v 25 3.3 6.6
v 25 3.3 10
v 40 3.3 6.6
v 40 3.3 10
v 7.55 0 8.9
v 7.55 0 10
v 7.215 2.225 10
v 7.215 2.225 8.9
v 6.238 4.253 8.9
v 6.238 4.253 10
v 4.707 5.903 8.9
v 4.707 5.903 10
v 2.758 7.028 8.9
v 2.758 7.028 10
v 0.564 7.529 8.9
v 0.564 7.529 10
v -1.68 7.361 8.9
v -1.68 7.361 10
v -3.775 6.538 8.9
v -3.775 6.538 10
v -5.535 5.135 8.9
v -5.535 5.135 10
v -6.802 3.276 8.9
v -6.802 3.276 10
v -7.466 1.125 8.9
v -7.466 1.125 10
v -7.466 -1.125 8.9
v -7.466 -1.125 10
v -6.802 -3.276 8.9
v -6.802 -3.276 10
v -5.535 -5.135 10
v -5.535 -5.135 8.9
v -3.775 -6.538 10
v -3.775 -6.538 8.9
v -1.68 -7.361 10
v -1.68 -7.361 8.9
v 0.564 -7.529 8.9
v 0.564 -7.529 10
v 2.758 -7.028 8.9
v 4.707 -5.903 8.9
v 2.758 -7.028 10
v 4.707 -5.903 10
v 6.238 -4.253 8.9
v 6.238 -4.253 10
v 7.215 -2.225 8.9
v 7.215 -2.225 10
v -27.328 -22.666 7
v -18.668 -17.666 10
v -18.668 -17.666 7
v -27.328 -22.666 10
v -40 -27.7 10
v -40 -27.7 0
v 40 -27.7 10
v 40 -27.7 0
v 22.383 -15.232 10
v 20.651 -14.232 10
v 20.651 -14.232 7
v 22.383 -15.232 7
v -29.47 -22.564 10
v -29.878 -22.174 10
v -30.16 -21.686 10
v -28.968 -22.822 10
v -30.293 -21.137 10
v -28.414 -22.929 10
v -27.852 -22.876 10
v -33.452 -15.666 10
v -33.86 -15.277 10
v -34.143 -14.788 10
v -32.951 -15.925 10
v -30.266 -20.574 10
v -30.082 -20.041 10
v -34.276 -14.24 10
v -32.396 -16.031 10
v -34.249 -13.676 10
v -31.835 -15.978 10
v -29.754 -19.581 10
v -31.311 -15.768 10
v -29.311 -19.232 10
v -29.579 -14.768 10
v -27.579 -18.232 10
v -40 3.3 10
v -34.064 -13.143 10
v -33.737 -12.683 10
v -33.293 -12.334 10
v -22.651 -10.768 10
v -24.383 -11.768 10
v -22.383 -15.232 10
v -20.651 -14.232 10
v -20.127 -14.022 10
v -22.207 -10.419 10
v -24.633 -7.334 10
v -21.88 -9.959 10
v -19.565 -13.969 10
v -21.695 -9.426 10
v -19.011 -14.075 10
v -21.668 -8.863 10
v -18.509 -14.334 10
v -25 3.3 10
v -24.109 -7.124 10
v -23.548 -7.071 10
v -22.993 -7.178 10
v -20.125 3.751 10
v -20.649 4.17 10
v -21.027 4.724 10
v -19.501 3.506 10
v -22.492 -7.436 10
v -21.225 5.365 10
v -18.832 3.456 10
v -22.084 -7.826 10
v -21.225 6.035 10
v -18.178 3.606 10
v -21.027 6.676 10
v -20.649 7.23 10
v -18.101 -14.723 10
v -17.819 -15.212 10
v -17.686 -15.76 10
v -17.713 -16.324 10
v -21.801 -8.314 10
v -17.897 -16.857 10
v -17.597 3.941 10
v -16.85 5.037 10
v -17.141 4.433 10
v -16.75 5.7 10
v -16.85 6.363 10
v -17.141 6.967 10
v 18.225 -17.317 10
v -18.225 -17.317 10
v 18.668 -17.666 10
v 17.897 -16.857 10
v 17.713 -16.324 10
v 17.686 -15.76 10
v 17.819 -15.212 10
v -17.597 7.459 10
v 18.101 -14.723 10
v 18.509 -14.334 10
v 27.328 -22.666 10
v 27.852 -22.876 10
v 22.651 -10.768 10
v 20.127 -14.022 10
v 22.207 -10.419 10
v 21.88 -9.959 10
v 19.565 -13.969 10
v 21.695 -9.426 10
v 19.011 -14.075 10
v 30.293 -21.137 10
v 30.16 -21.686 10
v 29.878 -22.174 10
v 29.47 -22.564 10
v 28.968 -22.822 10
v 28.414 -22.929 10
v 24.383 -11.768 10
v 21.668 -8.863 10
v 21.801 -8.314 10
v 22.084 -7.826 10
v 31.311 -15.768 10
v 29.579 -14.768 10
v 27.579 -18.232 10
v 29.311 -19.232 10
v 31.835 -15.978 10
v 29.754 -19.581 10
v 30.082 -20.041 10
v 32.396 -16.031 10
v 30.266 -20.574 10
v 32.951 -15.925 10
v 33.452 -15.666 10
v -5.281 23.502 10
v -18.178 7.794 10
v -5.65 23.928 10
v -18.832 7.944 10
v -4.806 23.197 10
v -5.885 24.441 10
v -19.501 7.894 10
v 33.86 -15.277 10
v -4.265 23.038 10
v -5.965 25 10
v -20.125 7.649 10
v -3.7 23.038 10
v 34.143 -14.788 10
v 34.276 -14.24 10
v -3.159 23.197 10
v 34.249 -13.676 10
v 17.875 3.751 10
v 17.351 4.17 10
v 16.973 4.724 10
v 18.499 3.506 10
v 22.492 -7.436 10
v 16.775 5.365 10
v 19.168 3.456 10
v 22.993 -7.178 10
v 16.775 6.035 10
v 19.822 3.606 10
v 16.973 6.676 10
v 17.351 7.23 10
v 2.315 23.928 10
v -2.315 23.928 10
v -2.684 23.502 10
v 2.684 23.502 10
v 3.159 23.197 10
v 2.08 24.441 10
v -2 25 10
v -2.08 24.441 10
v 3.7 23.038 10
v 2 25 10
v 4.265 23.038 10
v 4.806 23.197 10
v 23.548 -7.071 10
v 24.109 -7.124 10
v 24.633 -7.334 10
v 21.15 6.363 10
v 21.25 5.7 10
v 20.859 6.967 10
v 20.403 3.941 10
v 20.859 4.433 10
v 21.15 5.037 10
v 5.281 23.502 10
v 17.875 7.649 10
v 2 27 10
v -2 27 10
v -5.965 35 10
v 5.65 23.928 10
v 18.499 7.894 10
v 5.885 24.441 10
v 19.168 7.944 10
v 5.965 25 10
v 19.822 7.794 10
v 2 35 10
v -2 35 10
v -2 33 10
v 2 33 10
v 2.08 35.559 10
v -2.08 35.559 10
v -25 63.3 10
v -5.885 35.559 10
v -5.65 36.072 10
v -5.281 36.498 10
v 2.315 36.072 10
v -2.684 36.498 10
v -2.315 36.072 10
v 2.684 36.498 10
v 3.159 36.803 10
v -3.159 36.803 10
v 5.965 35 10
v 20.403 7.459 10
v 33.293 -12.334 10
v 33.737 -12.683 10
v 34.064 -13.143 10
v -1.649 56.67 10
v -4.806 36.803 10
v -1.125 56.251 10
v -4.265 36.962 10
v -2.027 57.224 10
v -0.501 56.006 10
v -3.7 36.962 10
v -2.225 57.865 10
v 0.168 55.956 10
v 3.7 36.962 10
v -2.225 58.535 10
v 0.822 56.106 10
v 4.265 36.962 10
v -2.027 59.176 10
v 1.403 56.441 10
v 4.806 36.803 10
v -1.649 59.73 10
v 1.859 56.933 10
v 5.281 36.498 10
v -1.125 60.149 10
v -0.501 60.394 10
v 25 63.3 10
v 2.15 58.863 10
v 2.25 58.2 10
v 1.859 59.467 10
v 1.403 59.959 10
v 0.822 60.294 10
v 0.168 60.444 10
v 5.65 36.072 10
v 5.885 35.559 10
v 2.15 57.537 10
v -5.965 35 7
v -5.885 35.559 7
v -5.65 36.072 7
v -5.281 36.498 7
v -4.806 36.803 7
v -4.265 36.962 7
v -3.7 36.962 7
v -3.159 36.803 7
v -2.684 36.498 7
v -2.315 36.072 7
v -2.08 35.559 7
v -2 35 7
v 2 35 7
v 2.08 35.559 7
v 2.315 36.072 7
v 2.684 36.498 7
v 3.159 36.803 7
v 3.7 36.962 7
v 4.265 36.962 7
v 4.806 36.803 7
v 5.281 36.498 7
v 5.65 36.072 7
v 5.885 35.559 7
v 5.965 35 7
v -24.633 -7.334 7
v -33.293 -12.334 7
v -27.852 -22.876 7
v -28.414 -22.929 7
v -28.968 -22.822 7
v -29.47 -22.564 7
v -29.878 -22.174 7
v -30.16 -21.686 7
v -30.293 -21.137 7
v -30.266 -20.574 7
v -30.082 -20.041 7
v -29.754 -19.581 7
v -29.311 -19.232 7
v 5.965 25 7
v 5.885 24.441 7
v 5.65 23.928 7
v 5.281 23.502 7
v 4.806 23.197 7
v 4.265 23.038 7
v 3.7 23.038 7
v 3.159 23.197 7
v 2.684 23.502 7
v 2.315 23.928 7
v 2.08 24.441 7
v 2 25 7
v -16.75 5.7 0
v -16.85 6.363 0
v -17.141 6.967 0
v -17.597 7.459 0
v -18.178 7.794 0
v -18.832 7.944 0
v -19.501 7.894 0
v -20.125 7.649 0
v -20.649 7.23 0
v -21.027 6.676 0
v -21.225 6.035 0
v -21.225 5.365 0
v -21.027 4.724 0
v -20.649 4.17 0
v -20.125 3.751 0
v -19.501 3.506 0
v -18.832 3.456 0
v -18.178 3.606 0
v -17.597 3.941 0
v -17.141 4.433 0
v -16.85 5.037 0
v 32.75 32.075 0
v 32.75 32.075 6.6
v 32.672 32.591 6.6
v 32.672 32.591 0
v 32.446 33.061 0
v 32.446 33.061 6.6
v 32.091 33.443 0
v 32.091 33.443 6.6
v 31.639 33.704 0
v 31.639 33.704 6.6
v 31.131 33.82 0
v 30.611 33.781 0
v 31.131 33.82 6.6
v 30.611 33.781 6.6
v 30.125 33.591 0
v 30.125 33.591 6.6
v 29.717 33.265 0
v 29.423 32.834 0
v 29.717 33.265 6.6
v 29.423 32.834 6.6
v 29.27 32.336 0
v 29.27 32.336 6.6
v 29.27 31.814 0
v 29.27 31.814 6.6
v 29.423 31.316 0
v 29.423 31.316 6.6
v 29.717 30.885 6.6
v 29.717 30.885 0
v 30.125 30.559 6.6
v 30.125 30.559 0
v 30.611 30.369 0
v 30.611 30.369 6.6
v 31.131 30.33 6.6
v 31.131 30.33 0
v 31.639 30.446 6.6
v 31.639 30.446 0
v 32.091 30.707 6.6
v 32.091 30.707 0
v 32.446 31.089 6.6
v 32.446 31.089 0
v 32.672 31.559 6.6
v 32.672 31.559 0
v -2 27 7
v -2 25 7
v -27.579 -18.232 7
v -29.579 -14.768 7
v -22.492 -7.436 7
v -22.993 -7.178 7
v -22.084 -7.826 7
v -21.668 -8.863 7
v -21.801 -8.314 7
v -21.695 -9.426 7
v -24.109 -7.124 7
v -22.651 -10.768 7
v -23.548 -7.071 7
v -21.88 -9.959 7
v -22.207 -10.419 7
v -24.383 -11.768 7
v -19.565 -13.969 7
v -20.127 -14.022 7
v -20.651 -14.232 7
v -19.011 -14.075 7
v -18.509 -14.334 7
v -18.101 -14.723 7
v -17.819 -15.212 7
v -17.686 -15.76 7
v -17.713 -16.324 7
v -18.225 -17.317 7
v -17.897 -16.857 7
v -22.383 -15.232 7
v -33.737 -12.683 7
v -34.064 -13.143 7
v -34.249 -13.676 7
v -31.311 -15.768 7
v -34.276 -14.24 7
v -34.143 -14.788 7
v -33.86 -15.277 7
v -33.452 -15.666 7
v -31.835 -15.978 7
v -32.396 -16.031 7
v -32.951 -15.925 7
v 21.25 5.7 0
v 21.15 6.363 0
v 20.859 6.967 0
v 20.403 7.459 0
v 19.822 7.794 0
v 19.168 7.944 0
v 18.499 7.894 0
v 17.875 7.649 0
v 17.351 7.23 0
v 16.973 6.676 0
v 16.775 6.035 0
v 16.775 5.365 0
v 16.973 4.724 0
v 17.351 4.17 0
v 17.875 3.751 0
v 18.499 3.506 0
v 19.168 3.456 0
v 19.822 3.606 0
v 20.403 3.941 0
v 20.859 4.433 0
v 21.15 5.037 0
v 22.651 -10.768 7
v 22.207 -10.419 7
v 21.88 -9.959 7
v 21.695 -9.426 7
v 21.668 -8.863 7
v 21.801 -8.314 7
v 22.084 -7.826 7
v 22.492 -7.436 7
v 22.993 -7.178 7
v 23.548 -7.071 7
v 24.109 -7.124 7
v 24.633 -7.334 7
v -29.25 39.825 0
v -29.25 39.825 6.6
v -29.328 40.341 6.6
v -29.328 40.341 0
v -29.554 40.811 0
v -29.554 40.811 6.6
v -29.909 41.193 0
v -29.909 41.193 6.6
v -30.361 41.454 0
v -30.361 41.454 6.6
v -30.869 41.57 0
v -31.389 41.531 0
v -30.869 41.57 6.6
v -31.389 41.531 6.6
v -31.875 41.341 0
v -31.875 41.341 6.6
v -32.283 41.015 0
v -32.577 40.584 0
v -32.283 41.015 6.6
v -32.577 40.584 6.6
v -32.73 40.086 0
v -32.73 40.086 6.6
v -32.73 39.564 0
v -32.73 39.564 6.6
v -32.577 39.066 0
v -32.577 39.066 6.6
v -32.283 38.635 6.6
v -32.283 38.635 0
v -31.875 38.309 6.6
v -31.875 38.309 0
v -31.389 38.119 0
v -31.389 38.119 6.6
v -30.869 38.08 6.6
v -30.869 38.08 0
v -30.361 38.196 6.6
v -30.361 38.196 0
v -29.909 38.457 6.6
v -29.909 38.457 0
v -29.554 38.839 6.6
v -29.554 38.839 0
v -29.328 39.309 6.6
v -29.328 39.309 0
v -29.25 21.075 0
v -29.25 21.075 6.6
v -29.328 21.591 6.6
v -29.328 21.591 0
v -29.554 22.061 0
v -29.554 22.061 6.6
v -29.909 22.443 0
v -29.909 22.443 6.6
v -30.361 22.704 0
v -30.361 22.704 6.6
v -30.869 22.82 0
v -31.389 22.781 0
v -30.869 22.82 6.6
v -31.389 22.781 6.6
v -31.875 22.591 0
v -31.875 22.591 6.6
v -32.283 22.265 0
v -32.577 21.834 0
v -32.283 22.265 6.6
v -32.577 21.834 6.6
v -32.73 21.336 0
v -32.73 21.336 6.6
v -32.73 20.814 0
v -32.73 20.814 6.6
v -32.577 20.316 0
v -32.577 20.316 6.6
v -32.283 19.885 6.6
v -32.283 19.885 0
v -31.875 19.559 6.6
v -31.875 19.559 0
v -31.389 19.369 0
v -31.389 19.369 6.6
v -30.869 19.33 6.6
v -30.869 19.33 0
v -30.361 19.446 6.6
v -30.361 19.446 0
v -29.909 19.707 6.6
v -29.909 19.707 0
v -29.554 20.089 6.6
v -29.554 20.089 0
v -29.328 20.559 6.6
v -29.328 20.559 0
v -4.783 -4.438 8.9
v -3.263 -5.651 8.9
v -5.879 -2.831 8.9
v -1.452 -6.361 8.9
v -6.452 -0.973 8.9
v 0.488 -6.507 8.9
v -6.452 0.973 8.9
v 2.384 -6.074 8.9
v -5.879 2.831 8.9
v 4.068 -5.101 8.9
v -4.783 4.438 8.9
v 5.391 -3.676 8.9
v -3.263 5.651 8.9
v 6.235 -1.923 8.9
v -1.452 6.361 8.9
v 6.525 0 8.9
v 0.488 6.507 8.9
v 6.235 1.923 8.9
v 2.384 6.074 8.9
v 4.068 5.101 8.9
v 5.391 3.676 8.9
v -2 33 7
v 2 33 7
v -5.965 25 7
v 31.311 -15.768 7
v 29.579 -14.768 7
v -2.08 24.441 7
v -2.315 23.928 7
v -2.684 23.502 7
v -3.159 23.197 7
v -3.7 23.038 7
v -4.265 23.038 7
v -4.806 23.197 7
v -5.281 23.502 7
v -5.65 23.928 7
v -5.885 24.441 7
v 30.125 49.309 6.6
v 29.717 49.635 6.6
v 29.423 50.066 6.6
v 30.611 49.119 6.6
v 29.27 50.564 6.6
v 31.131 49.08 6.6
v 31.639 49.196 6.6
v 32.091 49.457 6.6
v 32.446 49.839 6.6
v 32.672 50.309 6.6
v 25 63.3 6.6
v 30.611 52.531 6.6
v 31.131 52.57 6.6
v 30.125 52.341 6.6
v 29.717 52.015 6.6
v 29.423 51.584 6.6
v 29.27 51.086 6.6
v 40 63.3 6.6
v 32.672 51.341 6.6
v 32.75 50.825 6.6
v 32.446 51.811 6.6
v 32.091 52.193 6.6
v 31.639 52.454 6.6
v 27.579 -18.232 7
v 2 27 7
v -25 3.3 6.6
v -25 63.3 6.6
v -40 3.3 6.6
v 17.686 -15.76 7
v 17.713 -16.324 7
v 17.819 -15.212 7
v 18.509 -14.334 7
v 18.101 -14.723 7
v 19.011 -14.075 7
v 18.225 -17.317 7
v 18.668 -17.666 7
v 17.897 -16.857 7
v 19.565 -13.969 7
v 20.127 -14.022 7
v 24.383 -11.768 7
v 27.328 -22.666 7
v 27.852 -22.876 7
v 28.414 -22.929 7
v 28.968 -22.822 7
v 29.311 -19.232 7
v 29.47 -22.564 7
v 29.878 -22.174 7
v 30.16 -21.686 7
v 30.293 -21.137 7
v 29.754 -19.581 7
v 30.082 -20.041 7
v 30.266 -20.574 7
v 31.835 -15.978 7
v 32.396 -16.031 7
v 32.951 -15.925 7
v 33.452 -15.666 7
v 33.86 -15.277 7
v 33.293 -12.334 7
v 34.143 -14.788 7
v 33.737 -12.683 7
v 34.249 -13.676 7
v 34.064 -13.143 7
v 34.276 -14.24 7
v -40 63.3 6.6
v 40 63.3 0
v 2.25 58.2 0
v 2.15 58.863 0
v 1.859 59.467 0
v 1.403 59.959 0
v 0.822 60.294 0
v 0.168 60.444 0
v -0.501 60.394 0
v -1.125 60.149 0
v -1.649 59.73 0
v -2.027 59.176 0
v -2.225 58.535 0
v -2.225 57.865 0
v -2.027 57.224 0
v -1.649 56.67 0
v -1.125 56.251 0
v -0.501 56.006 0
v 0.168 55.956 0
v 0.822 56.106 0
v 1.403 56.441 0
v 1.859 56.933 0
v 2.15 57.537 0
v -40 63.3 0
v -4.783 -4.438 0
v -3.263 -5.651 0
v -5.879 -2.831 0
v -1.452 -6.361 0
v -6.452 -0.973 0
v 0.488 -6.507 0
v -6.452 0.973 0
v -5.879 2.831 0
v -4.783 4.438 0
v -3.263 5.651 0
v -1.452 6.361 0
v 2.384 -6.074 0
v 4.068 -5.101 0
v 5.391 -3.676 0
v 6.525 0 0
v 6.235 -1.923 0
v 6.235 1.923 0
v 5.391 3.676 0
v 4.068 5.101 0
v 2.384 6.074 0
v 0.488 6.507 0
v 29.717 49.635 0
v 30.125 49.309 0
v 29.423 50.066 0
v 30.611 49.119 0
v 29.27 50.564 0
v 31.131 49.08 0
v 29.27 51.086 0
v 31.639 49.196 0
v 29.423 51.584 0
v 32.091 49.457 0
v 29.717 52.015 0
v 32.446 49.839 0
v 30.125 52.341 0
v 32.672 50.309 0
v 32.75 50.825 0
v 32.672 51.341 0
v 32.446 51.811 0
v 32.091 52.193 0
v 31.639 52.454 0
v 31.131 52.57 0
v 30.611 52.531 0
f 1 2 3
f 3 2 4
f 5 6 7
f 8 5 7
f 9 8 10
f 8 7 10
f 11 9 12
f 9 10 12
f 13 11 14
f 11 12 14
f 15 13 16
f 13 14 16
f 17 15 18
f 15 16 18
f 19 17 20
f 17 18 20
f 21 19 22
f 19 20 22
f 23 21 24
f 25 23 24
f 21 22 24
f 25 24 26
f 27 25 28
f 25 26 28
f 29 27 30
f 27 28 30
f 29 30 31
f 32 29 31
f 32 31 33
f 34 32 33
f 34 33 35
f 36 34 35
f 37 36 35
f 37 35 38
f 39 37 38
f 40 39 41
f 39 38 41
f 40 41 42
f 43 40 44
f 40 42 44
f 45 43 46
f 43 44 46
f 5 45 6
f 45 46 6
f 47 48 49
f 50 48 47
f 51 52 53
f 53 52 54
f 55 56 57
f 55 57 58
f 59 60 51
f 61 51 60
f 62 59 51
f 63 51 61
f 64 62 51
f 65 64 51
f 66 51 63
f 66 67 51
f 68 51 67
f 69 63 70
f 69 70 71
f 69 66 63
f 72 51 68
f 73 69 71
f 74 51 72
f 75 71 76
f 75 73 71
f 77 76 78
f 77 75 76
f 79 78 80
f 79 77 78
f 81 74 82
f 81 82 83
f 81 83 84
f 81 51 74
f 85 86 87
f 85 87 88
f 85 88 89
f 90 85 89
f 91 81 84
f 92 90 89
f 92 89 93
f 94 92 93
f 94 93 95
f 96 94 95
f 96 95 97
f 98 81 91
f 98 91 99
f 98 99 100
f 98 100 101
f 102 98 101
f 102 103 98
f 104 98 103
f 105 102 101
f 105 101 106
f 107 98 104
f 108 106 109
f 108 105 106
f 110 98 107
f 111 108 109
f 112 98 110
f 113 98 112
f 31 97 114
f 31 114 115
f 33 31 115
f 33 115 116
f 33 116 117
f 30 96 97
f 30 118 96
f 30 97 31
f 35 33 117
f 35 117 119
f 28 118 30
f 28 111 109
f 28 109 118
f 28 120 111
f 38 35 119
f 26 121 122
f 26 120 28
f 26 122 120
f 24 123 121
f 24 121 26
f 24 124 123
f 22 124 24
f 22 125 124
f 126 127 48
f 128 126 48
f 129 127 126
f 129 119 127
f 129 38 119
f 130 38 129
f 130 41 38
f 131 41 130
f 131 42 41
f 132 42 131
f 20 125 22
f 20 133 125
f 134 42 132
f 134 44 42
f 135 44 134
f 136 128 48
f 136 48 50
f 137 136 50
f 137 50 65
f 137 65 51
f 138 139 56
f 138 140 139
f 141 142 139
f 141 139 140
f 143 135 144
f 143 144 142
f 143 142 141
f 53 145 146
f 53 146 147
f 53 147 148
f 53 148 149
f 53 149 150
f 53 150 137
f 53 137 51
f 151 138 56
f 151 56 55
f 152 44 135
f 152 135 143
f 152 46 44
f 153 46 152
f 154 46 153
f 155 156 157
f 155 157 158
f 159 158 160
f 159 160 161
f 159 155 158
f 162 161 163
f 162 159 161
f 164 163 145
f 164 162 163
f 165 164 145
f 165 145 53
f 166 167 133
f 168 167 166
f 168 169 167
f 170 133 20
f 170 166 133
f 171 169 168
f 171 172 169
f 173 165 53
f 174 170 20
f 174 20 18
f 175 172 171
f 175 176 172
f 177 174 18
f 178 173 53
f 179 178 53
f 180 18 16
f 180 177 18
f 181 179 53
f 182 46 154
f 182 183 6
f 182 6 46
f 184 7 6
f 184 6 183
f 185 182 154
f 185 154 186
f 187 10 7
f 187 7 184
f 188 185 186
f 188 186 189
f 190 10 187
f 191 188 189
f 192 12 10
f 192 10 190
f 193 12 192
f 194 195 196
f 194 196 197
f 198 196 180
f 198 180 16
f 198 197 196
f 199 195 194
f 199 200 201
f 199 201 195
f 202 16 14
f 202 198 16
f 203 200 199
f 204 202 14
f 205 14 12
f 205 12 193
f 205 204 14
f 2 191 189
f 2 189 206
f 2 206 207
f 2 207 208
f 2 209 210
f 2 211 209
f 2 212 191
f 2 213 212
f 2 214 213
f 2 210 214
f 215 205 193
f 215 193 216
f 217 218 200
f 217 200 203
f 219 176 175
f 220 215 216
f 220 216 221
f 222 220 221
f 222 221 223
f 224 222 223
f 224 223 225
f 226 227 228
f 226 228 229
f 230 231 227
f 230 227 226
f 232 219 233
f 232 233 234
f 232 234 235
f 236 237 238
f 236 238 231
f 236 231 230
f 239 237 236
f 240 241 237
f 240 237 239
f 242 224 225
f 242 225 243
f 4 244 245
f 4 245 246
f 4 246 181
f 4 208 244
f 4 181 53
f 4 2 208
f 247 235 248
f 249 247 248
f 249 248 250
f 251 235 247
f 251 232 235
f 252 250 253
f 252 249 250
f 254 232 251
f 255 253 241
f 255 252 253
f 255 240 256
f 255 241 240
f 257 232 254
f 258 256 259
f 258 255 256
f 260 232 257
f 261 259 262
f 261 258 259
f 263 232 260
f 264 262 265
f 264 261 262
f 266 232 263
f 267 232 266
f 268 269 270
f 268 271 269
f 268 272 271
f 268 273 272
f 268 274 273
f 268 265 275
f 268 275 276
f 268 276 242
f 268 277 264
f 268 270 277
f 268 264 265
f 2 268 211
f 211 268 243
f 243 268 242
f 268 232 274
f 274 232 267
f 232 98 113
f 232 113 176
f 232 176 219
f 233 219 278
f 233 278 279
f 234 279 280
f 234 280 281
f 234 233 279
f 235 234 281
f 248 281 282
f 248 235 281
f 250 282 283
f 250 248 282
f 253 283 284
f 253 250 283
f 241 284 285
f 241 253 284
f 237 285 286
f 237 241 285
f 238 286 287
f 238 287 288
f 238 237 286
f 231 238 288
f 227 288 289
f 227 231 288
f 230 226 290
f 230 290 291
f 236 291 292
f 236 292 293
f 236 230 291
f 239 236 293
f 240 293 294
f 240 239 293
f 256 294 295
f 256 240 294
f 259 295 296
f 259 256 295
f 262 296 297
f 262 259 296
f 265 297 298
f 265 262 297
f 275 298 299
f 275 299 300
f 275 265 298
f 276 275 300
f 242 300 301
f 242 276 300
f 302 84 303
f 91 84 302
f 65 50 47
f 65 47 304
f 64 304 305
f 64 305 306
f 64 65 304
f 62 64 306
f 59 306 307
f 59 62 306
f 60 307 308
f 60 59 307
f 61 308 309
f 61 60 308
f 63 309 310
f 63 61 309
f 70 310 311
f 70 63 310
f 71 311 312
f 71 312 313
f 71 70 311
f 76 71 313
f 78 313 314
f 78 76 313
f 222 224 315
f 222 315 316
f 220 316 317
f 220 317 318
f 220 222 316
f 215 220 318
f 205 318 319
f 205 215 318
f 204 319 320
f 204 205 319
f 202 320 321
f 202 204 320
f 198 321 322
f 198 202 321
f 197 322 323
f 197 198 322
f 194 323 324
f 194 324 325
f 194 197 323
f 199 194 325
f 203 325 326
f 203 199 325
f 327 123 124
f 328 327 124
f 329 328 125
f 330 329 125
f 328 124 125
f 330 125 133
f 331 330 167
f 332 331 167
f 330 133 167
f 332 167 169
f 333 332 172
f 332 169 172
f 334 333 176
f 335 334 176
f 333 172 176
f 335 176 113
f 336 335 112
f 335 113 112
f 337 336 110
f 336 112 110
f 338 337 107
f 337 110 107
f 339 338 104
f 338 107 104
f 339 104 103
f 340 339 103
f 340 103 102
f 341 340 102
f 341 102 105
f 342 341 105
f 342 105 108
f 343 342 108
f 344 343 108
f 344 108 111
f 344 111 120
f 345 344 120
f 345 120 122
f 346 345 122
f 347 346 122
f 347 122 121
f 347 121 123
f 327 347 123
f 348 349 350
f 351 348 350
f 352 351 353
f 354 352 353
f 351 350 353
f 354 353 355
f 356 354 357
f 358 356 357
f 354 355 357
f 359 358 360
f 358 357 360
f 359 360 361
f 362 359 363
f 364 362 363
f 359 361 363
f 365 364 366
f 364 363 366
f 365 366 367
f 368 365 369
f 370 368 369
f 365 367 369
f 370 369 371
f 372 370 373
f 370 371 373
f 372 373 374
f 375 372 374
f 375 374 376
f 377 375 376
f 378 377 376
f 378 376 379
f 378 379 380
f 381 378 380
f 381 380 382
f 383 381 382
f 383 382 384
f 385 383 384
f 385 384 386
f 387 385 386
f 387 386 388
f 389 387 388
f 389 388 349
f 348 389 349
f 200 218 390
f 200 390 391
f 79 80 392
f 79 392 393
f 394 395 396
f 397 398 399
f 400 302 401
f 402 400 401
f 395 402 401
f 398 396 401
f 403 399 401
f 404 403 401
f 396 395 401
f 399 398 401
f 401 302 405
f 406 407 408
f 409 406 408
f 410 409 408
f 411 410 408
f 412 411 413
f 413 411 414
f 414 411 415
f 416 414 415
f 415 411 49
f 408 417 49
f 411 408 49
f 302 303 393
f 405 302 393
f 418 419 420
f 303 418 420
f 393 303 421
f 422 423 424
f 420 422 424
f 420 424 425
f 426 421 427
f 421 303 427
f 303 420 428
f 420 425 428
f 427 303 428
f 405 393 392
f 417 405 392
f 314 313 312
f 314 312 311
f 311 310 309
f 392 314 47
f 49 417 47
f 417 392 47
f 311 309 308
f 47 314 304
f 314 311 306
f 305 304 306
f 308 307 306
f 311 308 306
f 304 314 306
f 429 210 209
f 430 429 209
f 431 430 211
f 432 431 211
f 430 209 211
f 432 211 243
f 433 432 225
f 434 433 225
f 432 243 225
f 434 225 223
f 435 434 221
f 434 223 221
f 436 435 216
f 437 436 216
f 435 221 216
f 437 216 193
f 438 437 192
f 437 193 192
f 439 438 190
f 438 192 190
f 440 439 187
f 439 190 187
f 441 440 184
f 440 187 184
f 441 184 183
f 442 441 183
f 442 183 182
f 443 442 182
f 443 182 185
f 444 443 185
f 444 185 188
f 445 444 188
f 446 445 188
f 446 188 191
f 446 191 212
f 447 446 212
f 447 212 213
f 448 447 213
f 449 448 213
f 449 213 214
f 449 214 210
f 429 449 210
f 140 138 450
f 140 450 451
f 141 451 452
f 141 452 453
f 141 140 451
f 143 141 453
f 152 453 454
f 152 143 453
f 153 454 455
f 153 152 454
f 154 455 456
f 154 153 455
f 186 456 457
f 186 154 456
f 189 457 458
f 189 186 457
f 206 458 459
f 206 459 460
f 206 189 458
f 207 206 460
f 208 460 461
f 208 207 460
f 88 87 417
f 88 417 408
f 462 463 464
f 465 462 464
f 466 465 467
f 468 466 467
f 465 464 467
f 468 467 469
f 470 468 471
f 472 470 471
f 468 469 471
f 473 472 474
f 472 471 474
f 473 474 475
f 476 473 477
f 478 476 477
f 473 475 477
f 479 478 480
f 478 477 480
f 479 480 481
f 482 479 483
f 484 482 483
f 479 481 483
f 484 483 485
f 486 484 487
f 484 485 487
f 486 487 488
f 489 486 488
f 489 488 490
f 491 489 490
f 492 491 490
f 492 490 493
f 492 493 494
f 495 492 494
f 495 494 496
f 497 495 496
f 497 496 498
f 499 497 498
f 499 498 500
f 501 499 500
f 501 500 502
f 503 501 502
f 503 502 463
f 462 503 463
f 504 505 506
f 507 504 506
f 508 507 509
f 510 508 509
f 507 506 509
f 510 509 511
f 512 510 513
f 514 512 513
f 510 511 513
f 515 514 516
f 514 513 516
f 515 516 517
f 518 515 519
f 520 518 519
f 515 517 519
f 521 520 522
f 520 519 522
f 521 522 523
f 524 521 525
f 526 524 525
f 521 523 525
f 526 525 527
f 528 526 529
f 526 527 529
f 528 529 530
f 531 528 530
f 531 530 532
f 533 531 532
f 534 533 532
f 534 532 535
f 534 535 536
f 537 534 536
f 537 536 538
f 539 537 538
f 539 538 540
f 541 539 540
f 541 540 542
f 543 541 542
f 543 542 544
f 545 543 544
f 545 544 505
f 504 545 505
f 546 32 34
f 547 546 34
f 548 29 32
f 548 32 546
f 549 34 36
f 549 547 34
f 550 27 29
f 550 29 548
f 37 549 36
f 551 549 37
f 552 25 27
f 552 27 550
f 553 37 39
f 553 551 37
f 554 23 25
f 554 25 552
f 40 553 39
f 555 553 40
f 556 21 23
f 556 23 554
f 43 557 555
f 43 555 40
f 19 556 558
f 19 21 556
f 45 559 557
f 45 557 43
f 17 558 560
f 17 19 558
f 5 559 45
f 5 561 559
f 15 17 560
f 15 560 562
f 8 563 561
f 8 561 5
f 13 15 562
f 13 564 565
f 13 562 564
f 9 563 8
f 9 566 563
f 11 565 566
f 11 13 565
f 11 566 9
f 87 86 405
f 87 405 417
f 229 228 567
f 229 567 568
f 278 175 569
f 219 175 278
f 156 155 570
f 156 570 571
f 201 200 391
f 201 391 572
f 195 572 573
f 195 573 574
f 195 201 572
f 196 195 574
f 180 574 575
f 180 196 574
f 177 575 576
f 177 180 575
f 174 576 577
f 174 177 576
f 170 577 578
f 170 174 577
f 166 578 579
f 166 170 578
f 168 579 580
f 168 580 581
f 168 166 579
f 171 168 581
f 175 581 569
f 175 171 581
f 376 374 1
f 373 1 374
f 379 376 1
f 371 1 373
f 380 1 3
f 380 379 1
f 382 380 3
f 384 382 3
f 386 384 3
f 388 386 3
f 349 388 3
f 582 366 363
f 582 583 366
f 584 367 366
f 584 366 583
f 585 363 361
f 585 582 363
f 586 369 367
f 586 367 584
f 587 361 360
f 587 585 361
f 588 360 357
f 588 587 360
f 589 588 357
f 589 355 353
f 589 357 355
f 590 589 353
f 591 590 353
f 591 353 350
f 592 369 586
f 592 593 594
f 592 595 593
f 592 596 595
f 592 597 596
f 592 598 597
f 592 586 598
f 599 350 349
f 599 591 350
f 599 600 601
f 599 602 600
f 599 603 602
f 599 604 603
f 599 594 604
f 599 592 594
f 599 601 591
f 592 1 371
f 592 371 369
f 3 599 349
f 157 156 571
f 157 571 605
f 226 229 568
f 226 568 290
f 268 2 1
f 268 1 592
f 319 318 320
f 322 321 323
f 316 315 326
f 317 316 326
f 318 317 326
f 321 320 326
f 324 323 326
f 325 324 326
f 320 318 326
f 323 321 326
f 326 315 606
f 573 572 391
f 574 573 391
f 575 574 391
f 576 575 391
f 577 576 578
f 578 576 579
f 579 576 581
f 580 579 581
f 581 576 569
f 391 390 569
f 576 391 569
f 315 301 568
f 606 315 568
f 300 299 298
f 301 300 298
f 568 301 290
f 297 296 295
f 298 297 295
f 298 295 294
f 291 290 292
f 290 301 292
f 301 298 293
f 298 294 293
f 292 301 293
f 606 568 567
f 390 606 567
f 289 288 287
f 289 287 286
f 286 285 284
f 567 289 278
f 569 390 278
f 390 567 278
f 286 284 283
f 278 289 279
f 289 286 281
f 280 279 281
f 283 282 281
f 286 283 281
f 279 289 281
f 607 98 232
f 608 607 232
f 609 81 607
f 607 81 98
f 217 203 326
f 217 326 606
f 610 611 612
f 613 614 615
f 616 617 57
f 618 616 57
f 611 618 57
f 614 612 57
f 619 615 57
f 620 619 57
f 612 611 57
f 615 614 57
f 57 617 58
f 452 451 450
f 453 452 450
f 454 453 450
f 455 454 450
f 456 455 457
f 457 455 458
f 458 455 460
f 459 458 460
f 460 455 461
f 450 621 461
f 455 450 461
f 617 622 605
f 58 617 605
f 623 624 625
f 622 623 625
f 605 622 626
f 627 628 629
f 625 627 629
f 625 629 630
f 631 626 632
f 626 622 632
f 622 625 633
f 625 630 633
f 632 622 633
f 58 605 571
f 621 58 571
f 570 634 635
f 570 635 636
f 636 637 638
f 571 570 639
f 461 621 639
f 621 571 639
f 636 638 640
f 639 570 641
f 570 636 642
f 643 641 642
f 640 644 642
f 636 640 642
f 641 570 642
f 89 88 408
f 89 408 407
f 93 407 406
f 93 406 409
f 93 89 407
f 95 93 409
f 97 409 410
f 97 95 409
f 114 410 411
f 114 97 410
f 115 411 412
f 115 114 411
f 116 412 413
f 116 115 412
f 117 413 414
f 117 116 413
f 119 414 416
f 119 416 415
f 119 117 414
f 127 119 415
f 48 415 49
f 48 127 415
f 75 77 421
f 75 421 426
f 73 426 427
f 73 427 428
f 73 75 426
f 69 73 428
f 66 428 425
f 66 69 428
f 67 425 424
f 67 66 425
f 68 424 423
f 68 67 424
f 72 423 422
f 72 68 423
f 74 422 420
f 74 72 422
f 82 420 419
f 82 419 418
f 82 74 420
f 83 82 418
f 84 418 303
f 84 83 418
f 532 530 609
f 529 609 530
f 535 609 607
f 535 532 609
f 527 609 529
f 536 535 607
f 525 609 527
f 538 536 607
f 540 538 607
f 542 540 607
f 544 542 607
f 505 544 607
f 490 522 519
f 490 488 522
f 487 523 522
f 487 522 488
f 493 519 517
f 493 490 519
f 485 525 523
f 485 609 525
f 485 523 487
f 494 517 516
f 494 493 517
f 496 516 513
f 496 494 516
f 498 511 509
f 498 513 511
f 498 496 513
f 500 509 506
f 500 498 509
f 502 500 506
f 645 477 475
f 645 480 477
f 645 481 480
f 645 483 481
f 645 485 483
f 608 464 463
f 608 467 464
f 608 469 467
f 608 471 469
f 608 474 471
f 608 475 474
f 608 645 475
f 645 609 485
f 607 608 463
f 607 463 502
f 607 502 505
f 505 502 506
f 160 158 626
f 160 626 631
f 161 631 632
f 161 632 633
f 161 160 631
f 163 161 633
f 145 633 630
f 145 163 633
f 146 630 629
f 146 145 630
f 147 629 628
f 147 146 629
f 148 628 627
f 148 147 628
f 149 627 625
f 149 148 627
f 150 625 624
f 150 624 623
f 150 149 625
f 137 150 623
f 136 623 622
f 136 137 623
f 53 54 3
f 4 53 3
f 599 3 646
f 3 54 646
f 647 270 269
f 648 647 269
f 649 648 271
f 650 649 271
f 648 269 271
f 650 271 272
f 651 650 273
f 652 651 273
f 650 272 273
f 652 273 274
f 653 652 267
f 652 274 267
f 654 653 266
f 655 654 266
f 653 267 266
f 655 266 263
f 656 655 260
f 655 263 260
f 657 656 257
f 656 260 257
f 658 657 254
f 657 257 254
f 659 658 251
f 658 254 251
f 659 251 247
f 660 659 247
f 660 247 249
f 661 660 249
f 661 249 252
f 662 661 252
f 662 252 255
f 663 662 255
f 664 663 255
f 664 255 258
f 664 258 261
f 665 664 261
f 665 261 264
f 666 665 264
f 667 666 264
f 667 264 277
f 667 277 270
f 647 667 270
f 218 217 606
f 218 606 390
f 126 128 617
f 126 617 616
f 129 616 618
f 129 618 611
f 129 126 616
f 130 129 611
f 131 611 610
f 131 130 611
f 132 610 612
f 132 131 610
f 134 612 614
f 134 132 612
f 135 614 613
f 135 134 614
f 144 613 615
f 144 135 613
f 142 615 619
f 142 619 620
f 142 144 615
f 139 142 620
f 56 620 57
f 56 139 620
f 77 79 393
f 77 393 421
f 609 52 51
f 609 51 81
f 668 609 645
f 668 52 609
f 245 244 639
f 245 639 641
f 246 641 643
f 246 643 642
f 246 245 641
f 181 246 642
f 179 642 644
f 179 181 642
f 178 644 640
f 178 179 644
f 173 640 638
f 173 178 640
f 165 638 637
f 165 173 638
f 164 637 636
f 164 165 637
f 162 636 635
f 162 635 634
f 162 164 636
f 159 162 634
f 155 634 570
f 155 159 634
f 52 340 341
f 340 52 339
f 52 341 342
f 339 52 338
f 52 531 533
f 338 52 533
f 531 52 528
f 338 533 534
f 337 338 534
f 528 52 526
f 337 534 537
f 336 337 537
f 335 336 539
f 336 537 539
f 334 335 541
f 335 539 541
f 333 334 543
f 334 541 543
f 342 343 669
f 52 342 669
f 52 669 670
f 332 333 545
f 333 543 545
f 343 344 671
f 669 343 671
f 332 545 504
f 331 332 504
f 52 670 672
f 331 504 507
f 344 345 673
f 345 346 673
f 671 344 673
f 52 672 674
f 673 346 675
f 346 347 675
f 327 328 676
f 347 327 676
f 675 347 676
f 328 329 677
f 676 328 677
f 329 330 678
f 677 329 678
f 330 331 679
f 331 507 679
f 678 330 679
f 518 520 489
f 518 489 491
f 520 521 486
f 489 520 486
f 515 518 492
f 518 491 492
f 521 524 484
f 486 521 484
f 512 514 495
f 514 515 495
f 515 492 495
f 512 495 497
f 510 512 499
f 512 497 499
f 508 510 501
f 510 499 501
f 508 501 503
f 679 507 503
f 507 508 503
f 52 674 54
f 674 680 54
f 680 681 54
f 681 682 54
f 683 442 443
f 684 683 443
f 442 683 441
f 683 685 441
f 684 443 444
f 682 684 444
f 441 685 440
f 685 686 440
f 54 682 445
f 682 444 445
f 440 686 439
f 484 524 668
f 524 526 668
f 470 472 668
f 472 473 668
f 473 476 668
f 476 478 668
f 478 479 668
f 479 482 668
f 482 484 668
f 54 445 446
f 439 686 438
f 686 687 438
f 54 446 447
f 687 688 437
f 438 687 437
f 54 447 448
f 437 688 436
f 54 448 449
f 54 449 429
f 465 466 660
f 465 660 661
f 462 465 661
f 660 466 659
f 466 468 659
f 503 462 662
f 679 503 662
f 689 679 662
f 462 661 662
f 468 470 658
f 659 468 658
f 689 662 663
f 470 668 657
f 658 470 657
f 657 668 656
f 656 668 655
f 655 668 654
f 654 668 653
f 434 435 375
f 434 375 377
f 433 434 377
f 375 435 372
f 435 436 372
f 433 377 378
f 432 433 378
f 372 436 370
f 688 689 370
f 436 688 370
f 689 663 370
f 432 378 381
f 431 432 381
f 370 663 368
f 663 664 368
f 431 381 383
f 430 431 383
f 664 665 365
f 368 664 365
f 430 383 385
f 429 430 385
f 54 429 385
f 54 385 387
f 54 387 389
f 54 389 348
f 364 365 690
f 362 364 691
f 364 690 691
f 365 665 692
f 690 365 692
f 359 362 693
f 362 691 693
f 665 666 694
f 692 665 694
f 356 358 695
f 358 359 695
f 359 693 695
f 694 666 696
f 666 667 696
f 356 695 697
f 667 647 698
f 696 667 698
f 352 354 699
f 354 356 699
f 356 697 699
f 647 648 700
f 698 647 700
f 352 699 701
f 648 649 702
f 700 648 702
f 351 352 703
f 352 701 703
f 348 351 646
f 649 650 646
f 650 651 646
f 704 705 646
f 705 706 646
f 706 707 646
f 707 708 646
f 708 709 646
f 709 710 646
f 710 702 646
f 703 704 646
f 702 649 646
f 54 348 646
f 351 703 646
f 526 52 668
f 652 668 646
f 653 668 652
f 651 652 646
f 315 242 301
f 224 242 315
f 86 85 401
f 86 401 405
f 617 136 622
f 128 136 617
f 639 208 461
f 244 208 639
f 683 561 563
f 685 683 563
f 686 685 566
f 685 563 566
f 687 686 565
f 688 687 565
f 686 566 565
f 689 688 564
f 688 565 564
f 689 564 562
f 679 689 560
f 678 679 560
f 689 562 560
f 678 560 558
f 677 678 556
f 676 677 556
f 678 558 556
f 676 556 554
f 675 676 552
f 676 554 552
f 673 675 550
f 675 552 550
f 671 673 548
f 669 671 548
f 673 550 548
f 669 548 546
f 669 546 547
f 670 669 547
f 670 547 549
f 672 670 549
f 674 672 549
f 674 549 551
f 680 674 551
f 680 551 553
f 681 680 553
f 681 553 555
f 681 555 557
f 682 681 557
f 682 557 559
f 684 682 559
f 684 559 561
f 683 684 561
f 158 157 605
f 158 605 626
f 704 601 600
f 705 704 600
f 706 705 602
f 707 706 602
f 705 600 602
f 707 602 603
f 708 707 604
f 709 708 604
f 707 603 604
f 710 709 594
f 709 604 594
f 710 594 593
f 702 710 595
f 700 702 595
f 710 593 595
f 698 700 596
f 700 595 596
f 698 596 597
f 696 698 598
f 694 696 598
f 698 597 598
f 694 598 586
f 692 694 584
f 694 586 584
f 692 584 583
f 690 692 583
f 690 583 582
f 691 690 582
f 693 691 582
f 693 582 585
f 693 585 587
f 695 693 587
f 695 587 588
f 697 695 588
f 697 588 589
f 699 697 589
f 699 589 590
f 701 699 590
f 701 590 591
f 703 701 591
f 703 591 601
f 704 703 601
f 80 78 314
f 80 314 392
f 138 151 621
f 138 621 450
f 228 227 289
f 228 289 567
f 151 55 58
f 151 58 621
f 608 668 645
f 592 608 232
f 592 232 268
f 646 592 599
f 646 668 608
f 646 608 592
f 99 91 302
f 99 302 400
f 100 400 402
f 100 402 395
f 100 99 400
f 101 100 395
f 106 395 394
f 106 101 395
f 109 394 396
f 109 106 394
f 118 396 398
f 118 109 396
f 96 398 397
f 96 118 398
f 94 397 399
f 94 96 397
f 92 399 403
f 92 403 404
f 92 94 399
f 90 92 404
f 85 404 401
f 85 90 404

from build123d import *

# Parameters (mm, degrees)
SKETCH1_W           = 80
SKETCH1_H           = 91
BOSS_EXTRUDE1_DEPTH = 10
SKETCH2_R           = 6.525
CUT_EXTRUDE1_DEPTH  = 76.543960712
SKETCH3_R           = 7.55
CUT_EXTRUDE2_DEPTH  = 1.1
CUT_EXTRUDE3_DEPTH  = 3
CIRPATTERN1_COUNT   = 3
SKETCH5_R           = 2.25
CUT_EXTRUDE4_DEPTH  = 76.543960712
SKETCH6_W           = 15
SKETCH6_H           = 60
CUT_EXTRUDE5_DEPTH  = 3.4
SKETCH7_R           = 1.75
CUT_EXTRUDE6_DEPTH  = 76.169475188


with BuildPart() as part:
    # Sketch1 → Boss-Extrude1 (new body)
    with BuildSketch(Plane.XY):
        with Locations((0, 17.8)):
            Rectangle(SKETCH1_W, SKETCH1_H)
    extrude(amount=BOSS_EXTRUDE1_DEPTH)

    # Sketch2 → Cut-Extrude1 (cut, through all)
    with BuildSketch(Plane.XY.offset(10)):
        Circle(SKETCH2_R)
    extrude(amount=-CUT_EXTRUDE1_DEPTH, mode=Mode.SUBTRACT)

    # Sketch3 → Cut-Extrude2 (cut)
    with BuildSketch(Plane.XY.offset(10)):
        Circle(SKETCH3_R)
    extrude(amount=-CUT_EXTRUDE2_DEPTH, mode=Mode.SUBTRACT)

    # Sketch4 → Cut-Extrude3 (cut)
    with BuildSketch(Plane.XY.offset(10)):
        with BuildLine():
            Line((-2, 35), (-2, 33))
            Line((-2, 33), (2, 33))
            Line((2, 33), (2, 35))
            ThreePointArc((2, 35), (3.9825, 36.9825), (5.965, 35))
            Line((5.965, 35), (5.965, 25))
            ThreePointArc((5.965, 25), (3.9825, 23.0175), (2, 25))
            Line((2, 25), (2, 27))
            Line((2, 27), (-2, 27))
            Line((-2, 27), (-2, 25))
            ThreePointArc((-2, 25), (-3.9825, 23.0175), (-5.965, 25))
            Line((-5.965, 25), (-5.965, 35))
            ThreePointArc((-5.965, 35), (-3.9825, 36.9825), (-2, 35))
        make_face()
    cut_extrude3 = extrude(amount=-CUT_EXTRUDE3_DEPTH, mode=Mode.SUBTRACT)

    # CirPattern1: Cut-Extrude3 ×3 about axis
    cirpattern1_axis = Axis((0, 0, 0), (0, 0, 1))
    for i in range(1, CIRPATTERN1_COUNT):
        add(cut_extrude3.rotate(cirpattern1_axis, i * 360 / CIRPATTERN1_COUNT), mode=Mode.SUBTRACT)

    # Sketch5 → Cut-Extrude4 (cut, through all)
    with BuildSketch(Plane.XY.offset(10)):
        with Locations((-19, 5.7)):
            Circle(SKETCH5_R)
        with Locations((19, 5.7)):
            Circle(SKETCH5_R)
        with Locations((0, 58.2)):
            Circle(SKETCH5_R)
    extrude(amount=-CUT_EXTRUDE4_DEPTH, mode=Mode.SUBTRACT)

    # Sketch6 → Cut-Extrude5 (cut)
    with BuildSketch(Plane.XY.offset(10)):
        with Locations((-32.5, 33.3)):
            Rectangle(SKETCH6_W, SKETCH6_H)
        with Locations((32.5, 33.3)):
            Rectangle(SKETCH6_W, SKETCH6_H)
    extrude(amount=-CUT_EXTRUDE5_DEPTH, mode=Mode.SUBTRACT)

    # Sketch7 → Cut-Extrude6 (cut, through all)
    with BuildSketch(Plane.XY.offset(6.6)):
        with Locations((-31, 21.075)):
            Circle(SKETCH7_R)
        with Locations((-31, 39.825)):
            Circle(SKETCH7_R)
        with Locations((31, 32.075)):
            Circle(SKETCH7_R)
        with Locations((31, 50.825)):
            Circle(SKETCH7_R)
    extrude(amount=-CUT_EXTRUDE6_DEPTH, mode=Mode.SUBTRACT)


solid = part.part
